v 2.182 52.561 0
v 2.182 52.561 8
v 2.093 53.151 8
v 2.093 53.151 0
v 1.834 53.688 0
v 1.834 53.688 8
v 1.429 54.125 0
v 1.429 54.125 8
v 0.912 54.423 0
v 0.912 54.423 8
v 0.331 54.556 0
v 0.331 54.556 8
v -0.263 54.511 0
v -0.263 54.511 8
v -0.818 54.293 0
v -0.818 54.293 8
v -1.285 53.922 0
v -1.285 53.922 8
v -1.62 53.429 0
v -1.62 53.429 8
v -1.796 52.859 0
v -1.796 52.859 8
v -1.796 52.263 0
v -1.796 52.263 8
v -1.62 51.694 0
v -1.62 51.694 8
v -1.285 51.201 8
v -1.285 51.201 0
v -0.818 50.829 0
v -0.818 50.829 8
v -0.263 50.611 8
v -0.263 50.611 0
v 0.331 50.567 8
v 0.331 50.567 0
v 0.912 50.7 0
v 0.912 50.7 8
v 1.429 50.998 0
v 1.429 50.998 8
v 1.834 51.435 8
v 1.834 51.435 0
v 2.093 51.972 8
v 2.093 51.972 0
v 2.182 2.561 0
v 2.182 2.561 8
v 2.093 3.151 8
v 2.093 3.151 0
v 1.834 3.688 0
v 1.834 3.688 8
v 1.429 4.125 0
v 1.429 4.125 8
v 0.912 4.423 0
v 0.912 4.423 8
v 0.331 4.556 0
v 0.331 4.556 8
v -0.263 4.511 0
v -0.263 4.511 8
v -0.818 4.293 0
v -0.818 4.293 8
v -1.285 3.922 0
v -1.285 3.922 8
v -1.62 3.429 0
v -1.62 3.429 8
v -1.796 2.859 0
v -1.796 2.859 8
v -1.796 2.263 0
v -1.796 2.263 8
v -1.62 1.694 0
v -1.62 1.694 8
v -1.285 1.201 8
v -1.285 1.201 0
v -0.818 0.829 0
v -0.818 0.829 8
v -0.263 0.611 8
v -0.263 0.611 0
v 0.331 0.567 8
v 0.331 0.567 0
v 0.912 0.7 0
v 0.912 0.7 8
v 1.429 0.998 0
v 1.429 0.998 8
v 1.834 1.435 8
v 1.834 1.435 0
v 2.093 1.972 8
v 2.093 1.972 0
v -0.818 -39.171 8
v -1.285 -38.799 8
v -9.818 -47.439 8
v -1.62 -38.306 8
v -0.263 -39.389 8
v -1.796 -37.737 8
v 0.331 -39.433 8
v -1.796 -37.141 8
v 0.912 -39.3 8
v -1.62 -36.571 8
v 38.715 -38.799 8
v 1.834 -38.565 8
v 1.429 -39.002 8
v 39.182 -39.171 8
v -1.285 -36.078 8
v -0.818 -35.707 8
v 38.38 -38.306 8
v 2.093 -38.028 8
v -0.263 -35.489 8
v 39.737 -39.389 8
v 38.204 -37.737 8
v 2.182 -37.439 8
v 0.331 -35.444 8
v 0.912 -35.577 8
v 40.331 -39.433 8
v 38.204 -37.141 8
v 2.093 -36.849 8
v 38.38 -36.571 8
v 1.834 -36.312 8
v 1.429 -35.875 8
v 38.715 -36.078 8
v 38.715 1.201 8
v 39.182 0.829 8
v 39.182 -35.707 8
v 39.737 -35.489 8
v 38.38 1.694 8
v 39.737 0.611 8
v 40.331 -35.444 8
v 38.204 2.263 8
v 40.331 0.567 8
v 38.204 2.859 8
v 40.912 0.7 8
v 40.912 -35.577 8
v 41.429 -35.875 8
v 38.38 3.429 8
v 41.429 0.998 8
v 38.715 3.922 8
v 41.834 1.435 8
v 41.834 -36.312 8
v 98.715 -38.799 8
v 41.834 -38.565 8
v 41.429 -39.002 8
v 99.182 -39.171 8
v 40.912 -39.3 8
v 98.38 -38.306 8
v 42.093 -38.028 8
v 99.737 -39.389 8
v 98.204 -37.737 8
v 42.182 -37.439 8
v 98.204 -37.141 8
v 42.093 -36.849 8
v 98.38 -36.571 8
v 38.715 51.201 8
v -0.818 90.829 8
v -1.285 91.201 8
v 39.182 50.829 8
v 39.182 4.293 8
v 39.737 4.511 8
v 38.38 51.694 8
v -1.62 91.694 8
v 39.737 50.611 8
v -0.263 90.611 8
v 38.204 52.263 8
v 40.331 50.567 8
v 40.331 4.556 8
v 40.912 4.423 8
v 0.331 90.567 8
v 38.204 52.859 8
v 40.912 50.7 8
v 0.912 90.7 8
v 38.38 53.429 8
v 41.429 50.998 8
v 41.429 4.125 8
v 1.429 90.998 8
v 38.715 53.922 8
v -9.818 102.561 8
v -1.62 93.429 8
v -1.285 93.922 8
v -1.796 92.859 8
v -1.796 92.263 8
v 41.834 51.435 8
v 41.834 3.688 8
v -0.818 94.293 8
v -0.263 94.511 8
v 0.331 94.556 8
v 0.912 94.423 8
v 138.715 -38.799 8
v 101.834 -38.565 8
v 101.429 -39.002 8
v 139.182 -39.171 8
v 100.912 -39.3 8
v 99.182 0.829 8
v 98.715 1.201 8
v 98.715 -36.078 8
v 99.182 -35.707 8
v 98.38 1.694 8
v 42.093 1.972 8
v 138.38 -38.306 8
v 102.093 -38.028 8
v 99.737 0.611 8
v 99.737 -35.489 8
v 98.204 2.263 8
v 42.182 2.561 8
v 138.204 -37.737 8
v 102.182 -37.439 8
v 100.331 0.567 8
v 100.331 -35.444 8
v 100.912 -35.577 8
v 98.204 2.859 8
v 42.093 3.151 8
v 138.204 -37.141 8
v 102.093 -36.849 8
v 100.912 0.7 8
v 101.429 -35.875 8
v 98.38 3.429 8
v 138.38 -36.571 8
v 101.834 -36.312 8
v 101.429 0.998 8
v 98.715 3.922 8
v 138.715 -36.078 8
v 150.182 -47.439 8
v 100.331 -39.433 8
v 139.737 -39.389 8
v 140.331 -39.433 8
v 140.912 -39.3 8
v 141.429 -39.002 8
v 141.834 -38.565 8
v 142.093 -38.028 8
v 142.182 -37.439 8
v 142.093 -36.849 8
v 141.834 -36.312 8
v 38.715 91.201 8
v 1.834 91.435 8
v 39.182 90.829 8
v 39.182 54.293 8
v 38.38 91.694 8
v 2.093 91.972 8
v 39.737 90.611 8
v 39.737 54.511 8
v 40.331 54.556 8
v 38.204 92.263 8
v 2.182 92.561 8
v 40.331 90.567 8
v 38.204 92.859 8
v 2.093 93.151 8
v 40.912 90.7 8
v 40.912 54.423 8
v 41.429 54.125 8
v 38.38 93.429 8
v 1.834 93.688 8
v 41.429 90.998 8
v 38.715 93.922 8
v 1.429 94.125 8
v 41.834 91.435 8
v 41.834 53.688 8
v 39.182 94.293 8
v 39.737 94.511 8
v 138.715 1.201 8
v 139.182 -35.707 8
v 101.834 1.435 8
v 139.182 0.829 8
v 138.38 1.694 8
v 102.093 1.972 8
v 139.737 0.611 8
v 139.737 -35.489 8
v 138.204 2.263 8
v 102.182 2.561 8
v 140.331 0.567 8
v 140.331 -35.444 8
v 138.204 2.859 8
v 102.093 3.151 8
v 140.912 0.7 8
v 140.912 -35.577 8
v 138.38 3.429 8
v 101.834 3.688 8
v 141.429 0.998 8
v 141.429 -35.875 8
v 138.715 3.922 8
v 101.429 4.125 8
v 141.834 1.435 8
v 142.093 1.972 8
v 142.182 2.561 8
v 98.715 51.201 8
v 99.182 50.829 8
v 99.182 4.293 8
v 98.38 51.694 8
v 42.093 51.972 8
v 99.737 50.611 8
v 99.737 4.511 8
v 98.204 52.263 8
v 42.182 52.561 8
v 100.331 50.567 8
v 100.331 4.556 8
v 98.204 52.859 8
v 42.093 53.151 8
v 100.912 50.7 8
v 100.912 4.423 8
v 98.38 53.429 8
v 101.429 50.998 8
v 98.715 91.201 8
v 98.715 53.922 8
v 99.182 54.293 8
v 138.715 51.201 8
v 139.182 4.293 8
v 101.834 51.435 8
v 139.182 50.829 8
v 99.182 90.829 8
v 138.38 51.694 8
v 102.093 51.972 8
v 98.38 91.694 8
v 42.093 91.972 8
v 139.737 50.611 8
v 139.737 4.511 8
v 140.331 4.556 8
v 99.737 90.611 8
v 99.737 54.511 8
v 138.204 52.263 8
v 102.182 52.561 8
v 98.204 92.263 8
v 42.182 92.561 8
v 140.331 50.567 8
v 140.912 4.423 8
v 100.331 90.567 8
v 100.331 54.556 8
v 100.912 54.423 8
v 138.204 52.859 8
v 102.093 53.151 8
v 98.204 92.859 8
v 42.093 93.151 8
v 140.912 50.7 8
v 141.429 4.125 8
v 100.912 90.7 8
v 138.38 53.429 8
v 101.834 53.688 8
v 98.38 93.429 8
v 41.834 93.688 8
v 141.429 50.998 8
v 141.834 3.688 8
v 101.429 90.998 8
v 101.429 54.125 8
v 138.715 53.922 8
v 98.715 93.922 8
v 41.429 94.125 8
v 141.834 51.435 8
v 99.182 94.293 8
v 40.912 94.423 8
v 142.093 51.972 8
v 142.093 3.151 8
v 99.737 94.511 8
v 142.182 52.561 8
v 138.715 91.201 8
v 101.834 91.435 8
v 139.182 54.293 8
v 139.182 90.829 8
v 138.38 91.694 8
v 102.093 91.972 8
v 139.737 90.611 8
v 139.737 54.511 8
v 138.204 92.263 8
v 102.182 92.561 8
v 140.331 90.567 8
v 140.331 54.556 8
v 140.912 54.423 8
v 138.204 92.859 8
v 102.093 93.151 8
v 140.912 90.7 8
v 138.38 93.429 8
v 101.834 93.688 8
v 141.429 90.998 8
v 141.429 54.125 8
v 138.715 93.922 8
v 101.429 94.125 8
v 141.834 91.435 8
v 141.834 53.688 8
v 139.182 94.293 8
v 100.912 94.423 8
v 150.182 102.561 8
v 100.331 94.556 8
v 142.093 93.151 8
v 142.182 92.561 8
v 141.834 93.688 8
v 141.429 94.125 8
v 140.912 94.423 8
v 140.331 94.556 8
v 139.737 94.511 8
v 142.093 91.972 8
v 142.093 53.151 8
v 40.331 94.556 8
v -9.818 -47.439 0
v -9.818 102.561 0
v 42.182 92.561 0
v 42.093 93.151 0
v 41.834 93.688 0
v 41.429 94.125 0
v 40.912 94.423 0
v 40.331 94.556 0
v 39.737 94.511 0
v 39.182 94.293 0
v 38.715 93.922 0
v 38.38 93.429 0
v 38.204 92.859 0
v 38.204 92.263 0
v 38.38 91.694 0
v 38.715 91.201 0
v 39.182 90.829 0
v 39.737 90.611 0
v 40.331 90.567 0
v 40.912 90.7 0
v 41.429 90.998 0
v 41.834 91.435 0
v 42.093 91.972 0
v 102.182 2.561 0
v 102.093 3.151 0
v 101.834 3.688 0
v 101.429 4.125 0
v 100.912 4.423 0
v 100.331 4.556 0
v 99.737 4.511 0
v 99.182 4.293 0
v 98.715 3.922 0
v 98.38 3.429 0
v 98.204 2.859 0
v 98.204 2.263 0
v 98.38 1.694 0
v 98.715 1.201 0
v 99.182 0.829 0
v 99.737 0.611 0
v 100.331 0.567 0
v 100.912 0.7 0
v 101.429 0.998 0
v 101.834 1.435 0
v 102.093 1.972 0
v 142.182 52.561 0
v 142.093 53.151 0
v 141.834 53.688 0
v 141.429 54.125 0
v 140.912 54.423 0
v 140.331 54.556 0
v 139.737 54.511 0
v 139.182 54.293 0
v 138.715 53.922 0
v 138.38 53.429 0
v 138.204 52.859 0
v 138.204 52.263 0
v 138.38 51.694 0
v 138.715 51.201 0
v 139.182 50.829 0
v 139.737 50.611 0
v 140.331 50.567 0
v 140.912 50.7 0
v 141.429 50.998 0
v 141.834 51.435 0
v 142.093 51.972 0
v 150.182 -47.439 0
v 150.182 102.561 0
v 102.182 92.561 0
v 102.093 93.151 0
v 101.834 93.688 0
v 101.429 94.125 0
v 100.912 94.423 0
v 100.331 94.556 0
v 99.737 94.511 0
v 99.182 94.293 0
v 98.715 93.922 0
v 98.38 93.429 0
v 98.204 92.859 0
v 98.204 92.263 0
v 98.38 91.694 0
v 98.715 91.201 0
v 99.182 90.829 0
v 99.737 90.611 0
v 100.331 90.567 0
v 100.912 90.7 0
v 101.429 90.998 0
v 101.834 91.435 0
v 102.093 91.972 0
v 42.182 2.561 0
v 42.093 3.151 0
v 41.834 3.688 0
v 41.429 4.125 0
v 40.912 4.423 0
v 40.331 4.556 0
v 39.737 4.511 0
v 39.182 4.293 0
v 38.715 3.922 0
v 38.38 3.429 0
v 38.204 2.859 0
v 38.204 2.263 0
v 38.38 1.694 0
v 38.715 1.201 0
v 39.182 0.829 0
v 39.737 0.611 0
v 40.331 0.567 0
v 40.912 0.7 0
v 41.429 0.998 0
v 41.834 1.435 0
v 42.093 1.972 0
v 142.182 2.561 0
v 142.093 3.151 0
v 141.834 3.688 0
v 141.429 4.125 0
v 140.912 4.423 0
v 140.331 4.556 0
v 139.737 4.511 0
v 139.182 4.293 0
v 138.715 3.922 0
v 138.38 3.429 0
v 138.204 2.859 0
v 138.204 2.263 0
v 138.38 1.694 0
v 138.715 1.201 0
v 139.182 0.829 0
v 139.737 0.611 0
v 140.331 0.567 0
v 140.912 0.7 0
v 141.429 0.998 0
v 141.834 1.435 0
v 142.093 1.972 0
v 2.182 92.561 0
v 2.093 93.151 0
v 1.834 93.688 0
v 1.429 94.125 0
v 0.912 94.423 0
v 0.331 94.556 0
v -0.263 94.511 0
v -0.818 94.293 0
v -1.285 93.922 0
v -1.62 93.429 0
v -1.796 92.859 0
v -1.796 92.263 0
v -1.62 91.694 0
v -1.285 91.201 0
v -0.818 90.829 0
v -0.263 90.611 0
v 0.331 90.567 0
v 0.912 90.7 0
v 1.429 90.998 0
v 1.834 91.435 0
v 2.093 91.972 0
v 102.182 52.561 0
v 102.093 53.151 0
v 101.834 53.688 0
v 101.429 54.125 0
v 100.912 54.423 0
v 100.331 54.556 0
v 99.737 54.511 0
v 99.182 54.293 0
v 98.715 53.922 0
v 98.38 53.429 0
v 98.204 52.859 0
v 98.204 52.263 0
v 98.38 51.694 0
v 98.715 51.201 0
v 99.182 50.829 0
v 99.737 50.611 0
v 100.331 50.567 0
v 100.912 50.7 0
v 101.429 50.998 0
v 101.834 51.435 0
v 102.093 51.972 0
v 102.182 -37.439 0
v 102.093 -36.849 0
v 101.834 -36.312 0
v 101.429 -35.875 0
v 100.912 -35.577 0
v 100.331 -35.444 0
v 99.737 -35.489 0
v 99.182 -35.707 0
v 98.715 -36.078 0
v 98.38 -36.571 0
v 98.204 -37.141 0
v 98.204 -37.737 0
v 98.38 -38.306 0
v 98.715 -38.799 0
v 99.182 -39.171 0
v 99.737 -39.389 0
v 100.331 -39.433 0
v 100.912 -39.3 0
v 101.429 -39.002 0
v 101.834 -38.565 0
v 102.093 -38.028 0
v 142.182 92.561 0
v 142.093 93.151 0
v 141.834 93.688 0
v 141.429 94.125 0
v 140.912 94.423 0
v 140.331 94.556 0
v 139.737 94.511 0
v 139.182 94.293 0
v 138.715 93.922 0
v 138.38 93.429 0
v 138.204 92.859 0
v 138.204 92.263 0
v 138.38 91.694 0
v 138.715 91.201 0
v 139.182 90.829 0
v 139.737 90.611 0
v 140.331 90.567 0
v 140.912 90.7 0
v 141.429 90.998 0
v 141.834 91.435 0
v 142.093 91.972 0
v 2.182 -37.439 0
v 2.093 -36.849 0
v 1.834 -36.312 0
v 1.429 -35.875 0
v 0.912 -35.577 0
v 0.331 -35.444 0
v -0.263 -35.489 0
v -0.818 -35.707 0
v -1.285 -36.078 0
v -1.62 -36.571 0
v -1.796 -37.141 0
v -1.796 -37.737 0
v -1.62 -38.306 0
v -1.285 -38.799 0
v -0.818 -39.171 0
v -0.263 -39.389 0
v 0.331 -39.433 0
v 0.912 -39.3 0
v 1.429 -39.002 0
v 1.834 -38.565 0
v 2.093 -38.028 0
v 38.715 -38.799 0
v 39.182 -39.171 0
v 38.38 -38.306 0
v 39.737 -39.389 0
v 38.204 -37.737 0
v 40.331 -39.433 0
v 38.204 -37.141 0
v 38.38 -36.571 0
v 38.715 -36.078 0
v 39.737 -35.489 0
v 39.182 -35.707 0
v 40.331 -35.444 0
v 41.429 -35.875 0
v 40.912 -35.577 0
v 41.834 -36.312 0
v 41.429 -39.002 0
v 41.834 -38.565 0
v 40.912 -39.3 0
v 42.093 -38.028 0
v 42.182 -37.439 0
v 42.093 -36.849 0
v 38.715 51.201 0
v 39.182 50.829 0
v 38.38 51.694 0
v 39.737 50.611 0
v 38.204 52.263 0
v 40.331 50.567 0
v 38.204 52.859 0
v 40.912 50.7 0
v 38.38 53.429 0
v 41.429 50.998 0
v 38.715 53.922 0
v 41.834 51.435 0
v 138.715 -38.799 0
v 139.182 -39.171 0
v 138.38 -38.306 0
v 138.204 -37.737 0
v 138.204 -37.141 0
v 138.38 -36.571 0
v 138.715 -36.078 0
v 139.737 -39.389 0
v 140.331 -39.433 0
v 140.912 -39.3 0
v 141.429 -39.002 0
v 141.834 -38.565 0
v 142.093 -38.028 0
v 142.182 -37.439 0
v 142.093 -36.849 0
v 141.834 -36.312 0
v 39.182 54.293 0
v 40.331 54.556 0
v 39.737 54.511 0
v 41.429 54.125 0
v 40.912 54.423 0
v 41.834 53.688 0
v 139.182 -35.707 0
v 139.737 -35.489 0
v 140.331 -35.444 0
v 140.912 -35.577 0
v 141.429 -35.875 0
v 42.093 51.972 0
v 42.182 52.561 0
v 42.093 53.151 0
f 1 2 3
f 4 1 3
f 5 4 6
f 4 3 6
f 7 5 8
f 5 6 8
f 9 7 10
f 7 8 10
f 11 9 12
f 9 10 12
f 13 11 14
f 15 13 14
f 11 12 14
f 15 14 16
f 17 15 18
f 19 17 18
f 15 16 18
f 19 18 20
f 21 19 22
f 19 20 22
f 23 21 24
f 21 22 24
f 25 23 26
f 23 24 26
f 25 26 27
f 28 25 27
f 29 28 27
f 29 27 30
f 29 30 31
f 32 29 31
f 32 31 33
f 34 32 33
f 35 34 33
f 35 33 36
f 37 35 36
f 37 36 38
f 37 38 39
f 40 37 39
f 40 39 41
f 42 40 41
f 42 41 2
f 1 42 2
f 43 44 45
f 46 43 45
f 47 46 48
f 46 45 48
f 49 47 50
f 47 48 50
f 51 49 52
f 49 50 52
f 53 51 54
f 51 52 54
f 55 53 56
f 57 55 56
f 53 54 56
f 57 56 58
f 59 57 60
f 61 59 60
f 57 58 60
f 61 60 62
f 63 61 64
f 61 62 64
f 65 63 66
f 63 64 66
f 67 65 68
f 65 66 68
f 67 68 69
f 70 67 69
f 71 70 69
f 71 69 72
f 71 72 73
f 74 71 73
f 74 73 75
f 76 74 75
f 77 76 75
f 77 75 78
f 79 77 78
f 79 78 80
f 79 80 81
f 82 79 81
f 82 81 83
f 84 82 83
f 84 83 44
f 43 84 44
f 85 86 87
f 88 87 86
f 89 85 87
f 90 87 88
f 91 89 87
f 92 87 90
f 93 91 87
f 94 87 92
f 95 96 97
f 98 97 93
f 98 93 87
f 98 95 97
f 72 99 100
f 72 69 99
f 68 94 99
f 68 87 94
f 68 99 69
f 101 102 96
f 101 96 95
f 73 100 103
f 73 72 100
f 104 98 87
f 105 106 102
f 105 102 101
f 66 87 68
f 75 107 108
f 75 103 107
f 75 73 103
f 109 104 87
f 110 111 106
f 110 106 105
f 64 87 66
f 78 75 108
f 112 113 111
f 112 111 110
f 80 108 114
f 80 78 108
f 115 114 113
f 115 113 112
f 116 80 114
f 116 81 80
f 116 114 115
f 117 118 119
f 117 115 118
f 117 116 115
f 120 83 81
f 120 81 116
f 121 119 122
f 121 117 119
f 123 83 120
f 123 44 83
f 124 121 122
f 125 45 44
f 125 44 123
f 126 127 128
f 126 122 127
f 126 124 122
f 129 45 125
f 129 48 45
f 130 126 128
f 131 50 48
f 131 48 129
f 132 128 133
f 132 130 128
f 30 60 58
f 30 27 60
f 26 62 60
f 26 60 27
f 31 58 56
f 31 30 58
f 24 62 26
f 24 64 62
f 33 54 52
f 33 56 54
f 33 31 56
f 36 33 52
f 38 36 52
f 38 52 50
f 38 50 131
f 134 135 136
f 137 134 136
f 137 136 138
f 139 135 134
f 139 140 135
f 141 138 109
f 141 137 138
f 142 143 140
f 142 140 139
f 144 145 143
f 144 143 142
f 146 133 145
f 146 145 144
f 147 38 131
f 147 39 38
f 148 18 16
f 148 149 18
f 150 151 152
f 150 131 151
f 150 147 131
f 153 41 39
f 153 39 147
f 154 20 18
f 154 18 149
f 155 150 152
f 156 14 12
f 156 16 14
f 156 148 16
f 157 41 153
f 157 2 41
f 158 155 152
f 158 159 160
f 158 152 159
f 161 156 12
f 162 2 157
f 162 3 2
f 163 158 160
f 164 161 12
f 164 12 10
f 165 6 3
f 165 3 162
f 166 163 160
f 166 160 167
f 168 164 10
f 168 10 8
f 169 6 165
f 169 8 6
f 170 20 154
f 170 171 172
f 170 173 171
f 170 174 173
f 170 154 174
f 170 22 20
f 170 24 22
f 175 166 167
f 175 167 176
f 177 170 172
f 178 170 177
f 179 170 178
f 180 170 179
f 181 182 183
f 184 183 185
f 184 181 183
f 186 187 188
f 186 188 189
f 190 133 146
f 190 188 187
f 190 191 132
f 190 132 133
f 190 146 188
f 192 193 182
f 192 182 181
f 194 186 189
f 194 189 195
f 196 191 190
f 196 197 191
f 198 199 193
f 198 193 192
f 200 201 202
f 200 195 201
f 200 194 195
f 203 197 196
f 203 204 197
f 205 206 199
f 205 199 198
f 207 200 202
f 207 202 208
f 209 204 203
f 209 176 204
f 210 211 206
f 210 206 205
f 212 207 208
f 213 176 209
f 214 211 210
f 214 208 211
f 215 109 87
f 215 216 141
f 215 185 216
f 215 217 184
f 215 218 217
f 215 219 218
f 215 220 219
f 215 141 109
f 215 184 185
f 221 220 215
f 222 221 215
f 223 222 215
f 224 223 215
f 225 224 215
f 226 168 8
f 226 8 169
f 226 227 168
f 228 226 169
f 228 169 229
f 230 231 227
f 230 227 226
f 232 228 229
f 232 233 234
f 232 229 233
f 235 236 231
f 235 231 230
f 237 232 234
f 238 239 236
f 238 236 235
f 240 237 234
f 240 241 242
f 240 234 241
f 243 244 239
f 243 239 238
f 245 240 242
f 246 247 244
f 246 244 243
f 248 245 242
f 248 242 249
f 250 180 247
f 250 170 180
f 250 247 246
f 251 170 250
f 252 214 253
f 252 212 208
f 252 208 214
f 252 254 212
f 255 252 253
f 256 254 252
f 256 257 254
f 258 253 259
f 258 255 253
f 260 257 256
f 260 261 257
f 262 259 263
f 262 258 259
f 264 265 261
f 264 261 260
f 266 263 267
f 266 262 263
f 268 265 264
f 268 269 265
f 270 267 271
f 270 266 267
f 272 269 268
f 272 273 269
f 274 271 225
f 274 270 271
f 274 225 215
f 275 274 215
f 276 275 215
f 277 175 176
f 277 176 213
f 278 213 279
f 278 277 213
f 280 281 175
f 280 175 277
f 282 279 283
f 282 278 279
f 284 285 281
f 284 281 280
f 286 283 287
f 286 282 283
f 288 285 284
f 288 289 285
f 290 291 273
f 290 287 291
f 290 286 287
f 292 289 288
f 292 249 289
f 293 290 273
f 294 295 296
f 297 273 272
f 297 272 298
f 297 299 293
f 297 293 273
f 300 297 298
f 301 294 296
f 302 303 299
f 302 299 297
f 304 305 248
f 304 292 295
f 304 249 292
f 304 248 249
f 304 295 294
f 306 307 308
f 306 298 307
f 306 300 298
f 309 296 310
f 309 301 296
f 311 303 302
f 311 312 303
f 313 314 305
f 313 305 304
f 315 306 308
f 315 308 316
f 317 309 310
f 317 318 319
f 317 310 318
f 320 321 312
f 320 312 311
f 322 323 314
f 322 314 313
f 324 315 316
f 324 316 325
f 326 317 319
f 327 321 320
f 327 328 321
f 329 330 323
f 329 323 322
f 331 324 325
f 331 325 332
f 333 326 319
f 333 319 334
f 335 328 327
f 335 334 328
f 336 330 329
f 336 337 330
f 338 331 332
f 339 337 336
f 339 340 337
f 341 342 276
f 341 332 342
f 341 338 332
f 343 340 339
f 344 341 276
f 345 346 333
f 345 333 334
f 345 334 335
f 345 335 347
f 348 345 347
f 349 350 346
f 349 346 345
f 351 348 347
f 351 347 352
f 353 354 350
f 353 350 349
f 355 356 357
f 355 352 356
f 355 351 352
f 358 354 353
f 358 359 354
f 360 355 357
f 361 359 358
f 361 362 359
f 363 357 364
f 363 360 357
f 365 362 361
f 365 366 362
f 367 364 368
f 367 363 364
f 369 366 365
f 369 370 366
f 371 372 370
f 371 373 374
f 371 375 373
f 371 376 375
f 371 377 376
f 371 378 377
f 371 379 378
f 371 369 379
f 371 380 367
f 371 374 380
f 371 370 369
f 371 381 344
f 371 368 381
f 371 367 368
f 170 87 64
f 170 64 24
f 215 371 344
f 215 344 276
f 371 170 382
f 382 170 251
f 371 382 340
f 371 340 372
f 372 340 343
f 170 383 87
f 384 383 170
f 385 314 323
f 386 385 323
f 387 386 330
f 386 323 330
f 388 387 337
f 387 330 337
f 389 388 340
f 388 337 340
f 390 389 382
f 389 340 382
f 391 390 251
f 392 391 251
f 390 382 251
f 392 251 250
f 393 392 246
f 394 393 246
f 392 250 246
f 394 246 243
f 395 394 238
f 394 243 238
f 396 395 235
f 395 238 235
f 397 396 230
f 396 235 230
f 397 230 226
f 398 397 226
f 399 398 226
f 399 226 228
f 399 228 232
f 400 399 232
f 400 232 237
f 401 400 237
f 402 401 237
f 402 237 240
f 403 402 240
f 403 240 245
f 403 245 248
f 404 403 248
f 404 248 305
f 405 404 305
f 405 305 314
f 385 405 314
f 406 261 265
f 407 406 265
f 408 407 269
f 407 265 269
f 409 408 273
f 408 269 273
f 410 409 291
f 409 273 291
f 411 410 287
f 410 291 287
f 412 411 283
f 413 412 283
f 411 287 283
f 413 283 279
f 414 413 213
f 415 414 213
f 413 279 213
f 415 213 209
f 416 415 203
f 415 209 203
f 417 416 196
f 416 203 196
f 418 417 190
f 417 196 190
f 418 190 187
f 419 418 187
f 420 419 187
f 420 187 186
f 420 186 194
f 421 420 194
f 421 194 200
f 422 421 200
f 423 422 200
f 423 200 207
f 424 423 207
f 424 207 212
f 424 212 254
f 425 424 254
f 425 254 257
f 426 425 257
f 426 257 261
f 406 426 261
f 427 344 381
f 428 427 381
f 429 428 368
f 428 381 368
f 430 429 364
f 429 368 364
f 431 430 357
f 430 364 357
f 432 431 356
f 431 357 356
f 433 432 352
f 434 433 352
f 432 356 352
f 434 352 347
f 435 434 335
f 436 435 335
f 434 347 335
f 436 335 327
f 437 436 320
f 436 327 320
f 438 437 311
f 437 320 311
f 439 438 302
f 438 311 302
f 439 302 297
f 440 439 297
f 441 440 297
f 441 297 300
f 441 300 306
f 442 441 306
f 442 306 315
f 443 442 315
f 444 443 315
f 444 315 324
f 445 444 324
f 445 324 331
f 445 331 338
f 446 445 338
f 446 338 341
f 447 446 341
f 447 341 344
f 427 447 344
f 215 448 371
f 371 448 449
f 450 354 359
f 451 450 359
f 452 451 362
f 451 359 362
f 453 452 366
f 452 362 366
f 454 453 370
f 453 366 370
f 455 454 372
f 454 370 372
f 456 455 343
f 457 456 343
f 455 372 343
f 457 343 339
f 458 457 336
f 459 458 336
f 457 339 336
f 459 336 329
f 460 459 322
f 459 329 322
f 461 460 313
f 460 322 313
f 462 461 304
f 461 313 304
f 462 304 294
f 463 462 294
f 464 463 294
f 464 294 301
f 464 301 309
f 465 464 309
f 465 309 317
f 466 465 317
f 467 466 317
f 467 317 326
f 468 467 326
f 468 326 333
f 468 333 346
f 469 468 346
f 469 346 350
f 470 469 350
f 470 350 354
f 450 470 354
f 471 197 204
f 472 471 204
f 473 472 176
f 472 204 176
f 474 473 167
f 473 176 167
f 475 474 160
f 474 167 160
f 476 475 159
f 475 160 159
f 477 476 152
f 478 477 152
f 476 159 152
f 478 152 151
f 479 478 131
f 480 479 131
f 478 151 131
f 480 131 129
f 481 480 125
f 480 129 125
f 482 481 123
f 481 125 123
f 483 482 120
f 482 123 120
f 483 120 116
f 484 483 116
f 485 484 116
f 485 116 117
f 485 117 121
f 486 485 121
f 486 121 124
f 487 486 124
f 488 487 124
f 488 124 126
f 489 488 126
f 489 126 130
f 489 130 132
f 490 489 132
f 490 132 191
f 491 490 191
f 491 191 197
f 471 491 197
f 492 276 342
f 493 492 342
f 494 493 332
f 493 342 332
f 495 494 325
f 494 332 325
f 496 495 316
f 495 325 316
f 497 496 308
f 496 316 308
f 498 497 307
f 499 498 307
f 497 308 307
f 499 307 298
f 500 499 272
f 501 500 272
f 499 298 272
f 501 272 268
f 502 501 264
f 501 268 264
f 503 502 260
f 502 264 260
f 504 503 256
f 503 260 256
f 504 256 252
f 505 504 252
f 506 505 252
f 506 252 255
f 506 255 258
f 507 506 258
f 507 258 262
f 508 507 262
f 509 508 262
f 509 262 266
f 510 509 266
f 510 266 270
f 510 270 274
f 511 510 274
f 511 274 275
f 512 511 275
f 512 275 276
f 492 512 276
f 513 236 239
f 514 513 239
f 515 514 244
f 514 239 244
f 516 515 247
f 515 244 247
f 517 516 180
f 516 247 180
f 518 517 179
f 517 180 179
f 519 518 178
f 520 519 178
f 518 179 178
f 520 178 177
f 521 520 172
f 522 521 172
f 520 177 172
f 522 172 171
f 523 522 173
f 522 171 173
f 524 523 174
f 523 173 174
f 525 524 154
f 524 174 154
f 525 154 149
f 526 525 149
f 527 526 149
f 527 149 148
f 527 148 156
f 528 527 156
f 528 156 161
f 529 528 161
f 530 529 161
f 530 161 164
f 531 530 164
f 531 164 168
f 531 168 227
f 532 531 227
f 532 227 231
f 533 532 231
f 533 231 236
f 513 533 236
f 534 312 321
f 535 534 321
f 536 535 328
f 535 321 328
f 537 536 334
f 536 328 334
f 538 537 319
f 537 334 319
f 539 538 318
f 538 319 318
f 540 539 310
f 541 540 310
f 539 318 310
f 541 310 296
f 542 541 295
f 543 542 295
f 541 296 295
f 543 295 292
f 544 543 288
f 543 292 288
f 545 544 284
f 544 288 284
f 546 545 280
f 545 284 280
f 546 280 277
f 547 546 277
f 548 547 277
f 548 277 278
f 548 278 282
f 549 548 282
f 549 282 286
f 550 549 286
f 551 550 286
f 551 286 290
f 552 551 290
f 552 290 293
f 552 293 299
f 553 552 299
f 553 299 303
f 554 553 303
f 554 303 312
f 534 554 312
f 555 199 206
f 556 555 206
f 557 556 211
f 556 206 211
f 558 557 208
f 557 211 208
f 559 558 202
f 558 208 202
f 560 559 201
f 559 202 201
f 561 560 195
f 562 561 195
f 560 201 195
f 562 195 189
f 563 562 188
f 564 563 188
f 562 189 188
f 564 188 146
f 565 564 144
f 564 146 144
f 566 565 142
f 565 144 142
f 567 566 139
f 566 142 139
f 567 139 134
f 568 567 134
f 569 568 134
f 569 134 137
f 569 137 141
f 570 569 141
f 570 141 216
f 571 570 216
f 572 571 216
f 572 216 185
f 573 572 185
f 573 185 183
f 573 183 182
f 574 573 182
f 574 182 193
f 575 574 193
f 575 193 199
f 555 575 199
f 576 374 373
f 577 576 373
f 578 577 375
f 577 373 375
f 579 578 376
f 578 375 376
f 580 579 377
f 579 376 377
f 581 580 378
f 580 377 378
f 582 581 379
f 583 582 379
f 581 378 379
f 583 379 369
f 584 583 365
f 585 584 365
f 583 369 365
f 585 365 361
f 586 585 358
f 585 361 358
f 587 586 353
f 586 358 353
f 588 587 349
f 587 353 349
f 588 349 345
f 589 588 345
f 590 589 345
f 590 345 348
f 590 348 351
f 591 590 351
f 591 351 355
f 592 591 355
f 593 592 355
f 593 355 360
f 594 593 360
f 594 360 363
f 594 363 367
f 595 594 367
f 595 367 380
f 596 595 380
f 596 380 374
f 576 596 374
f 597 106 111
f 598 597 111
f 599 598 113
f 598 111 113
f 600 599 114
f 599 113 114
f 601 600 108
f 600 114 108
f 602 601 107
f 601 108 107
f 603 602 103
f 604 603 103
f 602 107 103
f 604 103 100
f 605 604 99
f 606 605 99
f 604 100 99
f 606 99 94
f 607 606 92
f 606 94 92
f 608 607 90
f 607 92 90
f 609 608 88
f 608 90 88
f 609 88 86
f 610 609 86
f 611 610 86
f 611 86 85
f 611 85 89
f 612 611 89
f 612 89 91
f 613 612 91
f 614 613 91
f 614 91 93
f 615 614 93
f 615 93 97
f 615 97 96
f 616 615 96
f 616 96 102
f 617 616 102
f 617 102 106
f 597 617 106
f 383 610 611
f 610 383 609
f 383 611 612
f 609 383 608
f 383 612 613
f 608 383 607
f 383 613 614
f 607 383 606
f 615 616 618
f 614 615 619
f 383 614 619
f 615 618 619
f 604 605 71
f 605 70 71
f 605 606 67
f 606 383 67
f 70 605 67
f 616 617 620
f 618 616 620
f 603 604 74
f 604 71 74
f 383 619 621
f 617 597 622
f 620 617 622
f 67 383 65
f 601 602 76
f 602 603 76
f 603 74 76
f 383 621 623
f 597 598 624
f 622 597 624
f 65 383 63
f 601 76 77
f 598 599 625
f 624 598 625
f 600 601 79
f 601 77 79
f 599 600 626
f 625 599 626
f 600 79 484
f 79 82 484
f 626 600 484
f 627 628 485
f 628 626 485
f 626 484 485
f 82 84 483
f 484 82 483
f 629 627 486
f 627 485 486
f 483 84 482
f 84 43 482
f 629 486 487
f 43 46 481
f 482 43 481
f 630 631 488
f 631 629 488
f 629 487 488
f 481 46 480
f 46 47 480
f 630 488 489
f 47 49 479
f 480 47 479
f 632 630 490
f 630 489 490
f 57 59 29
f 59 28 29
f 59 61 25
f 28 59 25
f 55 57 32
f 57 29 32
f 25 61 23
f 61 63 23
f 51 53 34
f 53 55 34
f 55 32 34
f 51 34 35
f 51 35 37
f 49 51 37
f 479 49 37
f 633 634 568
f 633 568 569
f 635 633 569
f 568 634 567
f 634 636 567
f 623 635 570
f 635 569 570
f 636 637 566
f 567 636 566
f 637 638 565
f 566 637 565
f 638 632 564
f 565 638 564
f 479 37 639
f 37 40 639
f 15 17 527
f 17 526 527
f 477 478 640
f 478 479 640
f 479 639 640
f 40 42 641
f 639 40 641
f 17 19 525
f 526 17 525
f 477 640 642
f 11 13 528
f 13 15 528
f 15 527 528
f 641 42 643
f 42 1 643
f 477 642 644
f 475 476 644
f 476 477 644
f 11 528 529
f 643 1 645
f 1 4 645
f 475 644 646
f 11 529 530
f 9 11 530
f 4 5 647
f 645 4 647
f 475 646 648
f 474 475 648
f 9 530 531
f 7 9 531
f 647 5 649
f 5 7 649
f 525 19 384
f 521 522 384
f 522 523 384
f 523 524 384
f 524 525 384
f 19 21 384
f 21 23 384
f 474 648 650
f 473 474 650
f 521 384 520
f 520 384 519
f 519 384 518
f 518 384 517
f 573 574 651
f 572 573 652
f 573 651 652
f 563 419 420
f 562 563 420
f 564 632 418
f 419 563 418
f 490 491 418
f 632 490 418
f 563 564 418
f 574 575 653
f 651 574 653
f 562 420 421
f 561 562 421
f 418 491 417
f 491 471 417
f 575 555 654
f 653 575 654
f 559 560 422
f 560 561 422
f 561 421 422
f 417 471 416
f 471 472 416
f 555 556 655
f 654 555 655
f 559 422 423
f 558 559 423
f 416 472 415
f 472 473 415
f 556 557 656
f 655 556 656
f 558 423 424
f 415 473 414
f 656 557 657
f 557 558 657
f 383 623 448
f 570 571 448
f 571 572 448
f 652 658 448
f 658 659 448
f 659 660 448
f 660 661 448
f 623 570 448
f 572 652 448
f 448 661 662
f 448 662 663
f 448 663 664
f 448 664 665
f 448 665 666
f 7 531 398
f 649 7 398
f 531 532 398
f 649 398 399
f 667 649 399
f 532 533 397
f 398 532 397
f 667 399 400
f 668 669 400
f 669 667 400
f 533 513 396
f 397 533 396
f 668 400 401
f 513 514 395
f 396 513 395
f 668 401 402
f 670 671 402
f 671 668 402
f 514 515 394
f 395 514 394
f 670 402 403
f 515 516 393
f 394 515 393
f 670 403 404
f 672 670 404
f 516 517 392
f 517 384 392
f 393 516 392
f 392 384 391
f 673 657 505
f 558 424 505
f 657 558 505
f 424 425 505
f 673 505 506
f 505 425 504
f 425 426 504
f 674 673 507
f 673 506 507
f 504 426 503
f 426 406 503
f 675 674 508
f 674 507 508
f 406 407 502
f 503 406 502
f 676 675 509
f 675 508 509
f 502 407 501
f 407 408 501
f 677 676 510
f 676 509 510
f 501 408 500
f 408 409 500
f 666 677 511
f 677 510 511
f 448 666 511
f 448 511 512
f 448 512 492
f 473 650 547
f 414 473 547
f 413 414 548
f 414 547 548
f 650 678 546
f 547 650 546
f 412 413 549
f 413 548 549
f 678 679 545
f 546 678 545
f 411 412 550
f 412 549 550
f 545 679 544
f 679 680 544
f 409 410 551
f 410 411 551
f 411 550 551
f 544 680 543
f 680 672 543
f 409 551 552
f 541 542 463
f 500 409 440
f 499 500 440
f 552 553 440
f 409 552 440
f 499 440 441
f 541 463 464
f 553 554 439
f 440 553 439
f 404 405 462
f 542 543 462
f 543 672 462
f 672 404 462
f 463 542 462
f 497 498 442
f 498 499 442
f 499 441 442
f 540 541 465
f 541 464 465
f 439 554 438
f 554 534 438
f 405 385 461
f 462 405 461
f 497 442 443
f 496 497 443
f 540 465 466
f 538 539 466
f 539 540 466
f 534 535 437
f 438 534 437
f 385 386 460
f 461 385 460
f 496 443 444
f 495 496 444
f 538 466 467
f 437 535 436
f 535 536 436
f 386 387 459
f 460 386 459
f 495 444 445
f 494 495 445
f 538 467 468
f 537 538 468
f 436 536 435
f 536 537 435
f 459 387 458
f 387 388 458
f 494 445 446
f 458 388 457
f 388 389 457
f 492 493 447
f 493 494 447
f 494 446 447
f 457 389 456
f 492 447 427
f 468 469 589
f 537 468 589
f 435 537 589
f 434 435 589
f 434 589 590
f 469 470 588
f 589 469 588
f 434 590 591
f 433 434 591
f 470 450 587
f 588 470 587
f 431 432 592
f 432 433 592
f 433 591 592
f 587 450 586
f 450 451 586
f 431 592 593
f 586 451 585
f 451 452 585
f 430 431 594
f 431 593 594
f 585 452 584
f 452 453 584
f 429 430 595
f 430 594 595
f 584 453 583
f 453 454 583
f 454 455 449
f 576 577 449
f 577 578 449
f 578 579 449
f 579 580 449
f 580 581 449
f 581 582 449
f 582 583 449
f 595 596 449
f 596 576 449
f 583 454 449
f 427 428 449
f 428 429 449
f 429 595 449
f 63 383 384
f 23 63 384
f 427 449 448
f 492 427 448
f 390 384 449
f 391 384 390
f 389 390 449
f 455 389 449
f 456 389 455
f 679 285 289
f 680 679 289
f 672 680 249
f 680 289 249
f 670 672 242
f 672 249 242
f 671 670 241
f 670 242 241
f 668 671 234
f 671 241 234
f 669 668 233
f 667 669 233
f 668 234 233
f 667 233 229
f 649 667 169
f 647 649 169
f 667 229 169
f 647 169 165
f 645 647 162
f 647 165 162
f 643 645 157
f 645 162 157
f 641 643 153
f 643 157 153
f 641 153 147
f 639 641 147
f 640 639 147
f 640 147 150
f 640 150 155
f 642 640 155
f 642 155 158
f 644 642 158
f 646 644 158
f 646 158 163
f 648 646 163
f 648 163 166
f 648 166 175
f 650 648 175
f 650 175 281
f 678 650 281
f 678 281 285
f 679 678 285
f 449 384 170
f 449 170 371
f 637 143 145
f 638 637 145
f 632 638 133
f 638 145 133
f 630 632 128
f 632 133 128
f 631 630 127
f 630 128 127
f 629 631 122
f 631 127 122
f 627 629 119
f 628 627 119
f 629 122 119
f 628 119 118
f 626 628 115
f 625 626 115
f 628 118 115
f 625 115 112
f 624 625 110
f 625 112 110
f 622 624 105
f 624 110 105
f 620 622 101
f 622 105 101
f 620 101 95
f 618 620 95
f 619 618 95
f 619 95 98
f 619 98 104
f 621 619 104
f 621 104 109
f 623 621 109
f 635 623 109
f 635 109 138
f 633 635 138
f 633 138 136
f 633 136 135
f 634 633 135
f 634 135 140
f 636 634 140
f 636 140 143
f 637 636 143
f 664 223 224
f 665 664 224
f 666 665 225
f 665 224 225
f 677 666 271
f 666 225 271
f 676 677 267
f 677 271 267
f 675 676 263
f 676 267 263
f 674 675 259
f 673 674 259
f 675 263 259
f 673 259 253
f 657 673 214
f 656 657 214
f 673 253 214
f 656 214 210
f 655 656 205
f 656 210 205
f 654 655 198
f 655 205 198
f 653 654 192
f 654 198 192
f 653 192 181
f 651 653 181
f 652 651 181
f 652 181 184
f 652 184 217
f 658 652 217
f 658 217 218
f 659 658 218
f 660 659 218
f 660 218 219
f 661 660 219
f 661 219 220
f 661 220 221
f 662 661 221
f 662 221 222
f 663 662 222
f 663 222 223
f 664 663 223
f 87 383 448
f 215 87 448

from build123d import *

# Parameters (mm, degrees)
F0_W     = 160
F0_H     = 150
F1_DEPTH = 8
F3_R     = 2
F4_DEPTH = 8.001


with BuildPart() as f1:
    # F0 (on Top) → F1 (new body)
    with BuildSketch(Plane.XY):
        with Locations((70.181546, 27.561349)):
            Rectangle(F0_W, F0_H)
    extrude(amount=F1_DEPTH)

    # F3 (on face) → F4 (cut, through all)
    with BuildSketch(Plane.XY.offset(8)):
        with Locations((0.181546, 92.561349)):
            Circle(F3_R)
        with Locations((40.181546, 92.561349)):
            Circle(F3_R)
        with Locations((100.181546, 92.561349)):
            Circle(F3_R)
        with Locations((140.181546, 92.561349)):
            Circle(F3_R)
        with Locations((140.181546, 52.561349)):
            Circle(F3_R)
        with Locations((100.181546, 52.561349)):
            Circle(F3_R)
        with Locations((40.181546, 52.561349)):
            Circle(F3_R)
        with Locations((0.181546, 52.561349)):
            Circle(F3_R)
        with Locations((0.181546, 2.561349)):
            Circle(F3_R)
        with Locations((40.181546, 2.561349)):
            Circle(F3_R)
        with Locations((100.181546, 2.561349)):
            Circle(F3_R)
        with Locations((140.181546, 2.561349)):
            Circle(F3_R)
        with Locations((140.181546, -37.438651)):
            Circle(F3_R)
        with Locations((100.181546, -37.438651)):
            Circle(F3_R)
        with Locations((40.181546, -37.438651)):
            Circle(F3_R)
        with Locations((0.181546, -37.438651)):
            Circle(F3_R)
    extrude(amount=-F4_DEPTH, mode=Mode.SUBTRACT)


solid = f1.part
